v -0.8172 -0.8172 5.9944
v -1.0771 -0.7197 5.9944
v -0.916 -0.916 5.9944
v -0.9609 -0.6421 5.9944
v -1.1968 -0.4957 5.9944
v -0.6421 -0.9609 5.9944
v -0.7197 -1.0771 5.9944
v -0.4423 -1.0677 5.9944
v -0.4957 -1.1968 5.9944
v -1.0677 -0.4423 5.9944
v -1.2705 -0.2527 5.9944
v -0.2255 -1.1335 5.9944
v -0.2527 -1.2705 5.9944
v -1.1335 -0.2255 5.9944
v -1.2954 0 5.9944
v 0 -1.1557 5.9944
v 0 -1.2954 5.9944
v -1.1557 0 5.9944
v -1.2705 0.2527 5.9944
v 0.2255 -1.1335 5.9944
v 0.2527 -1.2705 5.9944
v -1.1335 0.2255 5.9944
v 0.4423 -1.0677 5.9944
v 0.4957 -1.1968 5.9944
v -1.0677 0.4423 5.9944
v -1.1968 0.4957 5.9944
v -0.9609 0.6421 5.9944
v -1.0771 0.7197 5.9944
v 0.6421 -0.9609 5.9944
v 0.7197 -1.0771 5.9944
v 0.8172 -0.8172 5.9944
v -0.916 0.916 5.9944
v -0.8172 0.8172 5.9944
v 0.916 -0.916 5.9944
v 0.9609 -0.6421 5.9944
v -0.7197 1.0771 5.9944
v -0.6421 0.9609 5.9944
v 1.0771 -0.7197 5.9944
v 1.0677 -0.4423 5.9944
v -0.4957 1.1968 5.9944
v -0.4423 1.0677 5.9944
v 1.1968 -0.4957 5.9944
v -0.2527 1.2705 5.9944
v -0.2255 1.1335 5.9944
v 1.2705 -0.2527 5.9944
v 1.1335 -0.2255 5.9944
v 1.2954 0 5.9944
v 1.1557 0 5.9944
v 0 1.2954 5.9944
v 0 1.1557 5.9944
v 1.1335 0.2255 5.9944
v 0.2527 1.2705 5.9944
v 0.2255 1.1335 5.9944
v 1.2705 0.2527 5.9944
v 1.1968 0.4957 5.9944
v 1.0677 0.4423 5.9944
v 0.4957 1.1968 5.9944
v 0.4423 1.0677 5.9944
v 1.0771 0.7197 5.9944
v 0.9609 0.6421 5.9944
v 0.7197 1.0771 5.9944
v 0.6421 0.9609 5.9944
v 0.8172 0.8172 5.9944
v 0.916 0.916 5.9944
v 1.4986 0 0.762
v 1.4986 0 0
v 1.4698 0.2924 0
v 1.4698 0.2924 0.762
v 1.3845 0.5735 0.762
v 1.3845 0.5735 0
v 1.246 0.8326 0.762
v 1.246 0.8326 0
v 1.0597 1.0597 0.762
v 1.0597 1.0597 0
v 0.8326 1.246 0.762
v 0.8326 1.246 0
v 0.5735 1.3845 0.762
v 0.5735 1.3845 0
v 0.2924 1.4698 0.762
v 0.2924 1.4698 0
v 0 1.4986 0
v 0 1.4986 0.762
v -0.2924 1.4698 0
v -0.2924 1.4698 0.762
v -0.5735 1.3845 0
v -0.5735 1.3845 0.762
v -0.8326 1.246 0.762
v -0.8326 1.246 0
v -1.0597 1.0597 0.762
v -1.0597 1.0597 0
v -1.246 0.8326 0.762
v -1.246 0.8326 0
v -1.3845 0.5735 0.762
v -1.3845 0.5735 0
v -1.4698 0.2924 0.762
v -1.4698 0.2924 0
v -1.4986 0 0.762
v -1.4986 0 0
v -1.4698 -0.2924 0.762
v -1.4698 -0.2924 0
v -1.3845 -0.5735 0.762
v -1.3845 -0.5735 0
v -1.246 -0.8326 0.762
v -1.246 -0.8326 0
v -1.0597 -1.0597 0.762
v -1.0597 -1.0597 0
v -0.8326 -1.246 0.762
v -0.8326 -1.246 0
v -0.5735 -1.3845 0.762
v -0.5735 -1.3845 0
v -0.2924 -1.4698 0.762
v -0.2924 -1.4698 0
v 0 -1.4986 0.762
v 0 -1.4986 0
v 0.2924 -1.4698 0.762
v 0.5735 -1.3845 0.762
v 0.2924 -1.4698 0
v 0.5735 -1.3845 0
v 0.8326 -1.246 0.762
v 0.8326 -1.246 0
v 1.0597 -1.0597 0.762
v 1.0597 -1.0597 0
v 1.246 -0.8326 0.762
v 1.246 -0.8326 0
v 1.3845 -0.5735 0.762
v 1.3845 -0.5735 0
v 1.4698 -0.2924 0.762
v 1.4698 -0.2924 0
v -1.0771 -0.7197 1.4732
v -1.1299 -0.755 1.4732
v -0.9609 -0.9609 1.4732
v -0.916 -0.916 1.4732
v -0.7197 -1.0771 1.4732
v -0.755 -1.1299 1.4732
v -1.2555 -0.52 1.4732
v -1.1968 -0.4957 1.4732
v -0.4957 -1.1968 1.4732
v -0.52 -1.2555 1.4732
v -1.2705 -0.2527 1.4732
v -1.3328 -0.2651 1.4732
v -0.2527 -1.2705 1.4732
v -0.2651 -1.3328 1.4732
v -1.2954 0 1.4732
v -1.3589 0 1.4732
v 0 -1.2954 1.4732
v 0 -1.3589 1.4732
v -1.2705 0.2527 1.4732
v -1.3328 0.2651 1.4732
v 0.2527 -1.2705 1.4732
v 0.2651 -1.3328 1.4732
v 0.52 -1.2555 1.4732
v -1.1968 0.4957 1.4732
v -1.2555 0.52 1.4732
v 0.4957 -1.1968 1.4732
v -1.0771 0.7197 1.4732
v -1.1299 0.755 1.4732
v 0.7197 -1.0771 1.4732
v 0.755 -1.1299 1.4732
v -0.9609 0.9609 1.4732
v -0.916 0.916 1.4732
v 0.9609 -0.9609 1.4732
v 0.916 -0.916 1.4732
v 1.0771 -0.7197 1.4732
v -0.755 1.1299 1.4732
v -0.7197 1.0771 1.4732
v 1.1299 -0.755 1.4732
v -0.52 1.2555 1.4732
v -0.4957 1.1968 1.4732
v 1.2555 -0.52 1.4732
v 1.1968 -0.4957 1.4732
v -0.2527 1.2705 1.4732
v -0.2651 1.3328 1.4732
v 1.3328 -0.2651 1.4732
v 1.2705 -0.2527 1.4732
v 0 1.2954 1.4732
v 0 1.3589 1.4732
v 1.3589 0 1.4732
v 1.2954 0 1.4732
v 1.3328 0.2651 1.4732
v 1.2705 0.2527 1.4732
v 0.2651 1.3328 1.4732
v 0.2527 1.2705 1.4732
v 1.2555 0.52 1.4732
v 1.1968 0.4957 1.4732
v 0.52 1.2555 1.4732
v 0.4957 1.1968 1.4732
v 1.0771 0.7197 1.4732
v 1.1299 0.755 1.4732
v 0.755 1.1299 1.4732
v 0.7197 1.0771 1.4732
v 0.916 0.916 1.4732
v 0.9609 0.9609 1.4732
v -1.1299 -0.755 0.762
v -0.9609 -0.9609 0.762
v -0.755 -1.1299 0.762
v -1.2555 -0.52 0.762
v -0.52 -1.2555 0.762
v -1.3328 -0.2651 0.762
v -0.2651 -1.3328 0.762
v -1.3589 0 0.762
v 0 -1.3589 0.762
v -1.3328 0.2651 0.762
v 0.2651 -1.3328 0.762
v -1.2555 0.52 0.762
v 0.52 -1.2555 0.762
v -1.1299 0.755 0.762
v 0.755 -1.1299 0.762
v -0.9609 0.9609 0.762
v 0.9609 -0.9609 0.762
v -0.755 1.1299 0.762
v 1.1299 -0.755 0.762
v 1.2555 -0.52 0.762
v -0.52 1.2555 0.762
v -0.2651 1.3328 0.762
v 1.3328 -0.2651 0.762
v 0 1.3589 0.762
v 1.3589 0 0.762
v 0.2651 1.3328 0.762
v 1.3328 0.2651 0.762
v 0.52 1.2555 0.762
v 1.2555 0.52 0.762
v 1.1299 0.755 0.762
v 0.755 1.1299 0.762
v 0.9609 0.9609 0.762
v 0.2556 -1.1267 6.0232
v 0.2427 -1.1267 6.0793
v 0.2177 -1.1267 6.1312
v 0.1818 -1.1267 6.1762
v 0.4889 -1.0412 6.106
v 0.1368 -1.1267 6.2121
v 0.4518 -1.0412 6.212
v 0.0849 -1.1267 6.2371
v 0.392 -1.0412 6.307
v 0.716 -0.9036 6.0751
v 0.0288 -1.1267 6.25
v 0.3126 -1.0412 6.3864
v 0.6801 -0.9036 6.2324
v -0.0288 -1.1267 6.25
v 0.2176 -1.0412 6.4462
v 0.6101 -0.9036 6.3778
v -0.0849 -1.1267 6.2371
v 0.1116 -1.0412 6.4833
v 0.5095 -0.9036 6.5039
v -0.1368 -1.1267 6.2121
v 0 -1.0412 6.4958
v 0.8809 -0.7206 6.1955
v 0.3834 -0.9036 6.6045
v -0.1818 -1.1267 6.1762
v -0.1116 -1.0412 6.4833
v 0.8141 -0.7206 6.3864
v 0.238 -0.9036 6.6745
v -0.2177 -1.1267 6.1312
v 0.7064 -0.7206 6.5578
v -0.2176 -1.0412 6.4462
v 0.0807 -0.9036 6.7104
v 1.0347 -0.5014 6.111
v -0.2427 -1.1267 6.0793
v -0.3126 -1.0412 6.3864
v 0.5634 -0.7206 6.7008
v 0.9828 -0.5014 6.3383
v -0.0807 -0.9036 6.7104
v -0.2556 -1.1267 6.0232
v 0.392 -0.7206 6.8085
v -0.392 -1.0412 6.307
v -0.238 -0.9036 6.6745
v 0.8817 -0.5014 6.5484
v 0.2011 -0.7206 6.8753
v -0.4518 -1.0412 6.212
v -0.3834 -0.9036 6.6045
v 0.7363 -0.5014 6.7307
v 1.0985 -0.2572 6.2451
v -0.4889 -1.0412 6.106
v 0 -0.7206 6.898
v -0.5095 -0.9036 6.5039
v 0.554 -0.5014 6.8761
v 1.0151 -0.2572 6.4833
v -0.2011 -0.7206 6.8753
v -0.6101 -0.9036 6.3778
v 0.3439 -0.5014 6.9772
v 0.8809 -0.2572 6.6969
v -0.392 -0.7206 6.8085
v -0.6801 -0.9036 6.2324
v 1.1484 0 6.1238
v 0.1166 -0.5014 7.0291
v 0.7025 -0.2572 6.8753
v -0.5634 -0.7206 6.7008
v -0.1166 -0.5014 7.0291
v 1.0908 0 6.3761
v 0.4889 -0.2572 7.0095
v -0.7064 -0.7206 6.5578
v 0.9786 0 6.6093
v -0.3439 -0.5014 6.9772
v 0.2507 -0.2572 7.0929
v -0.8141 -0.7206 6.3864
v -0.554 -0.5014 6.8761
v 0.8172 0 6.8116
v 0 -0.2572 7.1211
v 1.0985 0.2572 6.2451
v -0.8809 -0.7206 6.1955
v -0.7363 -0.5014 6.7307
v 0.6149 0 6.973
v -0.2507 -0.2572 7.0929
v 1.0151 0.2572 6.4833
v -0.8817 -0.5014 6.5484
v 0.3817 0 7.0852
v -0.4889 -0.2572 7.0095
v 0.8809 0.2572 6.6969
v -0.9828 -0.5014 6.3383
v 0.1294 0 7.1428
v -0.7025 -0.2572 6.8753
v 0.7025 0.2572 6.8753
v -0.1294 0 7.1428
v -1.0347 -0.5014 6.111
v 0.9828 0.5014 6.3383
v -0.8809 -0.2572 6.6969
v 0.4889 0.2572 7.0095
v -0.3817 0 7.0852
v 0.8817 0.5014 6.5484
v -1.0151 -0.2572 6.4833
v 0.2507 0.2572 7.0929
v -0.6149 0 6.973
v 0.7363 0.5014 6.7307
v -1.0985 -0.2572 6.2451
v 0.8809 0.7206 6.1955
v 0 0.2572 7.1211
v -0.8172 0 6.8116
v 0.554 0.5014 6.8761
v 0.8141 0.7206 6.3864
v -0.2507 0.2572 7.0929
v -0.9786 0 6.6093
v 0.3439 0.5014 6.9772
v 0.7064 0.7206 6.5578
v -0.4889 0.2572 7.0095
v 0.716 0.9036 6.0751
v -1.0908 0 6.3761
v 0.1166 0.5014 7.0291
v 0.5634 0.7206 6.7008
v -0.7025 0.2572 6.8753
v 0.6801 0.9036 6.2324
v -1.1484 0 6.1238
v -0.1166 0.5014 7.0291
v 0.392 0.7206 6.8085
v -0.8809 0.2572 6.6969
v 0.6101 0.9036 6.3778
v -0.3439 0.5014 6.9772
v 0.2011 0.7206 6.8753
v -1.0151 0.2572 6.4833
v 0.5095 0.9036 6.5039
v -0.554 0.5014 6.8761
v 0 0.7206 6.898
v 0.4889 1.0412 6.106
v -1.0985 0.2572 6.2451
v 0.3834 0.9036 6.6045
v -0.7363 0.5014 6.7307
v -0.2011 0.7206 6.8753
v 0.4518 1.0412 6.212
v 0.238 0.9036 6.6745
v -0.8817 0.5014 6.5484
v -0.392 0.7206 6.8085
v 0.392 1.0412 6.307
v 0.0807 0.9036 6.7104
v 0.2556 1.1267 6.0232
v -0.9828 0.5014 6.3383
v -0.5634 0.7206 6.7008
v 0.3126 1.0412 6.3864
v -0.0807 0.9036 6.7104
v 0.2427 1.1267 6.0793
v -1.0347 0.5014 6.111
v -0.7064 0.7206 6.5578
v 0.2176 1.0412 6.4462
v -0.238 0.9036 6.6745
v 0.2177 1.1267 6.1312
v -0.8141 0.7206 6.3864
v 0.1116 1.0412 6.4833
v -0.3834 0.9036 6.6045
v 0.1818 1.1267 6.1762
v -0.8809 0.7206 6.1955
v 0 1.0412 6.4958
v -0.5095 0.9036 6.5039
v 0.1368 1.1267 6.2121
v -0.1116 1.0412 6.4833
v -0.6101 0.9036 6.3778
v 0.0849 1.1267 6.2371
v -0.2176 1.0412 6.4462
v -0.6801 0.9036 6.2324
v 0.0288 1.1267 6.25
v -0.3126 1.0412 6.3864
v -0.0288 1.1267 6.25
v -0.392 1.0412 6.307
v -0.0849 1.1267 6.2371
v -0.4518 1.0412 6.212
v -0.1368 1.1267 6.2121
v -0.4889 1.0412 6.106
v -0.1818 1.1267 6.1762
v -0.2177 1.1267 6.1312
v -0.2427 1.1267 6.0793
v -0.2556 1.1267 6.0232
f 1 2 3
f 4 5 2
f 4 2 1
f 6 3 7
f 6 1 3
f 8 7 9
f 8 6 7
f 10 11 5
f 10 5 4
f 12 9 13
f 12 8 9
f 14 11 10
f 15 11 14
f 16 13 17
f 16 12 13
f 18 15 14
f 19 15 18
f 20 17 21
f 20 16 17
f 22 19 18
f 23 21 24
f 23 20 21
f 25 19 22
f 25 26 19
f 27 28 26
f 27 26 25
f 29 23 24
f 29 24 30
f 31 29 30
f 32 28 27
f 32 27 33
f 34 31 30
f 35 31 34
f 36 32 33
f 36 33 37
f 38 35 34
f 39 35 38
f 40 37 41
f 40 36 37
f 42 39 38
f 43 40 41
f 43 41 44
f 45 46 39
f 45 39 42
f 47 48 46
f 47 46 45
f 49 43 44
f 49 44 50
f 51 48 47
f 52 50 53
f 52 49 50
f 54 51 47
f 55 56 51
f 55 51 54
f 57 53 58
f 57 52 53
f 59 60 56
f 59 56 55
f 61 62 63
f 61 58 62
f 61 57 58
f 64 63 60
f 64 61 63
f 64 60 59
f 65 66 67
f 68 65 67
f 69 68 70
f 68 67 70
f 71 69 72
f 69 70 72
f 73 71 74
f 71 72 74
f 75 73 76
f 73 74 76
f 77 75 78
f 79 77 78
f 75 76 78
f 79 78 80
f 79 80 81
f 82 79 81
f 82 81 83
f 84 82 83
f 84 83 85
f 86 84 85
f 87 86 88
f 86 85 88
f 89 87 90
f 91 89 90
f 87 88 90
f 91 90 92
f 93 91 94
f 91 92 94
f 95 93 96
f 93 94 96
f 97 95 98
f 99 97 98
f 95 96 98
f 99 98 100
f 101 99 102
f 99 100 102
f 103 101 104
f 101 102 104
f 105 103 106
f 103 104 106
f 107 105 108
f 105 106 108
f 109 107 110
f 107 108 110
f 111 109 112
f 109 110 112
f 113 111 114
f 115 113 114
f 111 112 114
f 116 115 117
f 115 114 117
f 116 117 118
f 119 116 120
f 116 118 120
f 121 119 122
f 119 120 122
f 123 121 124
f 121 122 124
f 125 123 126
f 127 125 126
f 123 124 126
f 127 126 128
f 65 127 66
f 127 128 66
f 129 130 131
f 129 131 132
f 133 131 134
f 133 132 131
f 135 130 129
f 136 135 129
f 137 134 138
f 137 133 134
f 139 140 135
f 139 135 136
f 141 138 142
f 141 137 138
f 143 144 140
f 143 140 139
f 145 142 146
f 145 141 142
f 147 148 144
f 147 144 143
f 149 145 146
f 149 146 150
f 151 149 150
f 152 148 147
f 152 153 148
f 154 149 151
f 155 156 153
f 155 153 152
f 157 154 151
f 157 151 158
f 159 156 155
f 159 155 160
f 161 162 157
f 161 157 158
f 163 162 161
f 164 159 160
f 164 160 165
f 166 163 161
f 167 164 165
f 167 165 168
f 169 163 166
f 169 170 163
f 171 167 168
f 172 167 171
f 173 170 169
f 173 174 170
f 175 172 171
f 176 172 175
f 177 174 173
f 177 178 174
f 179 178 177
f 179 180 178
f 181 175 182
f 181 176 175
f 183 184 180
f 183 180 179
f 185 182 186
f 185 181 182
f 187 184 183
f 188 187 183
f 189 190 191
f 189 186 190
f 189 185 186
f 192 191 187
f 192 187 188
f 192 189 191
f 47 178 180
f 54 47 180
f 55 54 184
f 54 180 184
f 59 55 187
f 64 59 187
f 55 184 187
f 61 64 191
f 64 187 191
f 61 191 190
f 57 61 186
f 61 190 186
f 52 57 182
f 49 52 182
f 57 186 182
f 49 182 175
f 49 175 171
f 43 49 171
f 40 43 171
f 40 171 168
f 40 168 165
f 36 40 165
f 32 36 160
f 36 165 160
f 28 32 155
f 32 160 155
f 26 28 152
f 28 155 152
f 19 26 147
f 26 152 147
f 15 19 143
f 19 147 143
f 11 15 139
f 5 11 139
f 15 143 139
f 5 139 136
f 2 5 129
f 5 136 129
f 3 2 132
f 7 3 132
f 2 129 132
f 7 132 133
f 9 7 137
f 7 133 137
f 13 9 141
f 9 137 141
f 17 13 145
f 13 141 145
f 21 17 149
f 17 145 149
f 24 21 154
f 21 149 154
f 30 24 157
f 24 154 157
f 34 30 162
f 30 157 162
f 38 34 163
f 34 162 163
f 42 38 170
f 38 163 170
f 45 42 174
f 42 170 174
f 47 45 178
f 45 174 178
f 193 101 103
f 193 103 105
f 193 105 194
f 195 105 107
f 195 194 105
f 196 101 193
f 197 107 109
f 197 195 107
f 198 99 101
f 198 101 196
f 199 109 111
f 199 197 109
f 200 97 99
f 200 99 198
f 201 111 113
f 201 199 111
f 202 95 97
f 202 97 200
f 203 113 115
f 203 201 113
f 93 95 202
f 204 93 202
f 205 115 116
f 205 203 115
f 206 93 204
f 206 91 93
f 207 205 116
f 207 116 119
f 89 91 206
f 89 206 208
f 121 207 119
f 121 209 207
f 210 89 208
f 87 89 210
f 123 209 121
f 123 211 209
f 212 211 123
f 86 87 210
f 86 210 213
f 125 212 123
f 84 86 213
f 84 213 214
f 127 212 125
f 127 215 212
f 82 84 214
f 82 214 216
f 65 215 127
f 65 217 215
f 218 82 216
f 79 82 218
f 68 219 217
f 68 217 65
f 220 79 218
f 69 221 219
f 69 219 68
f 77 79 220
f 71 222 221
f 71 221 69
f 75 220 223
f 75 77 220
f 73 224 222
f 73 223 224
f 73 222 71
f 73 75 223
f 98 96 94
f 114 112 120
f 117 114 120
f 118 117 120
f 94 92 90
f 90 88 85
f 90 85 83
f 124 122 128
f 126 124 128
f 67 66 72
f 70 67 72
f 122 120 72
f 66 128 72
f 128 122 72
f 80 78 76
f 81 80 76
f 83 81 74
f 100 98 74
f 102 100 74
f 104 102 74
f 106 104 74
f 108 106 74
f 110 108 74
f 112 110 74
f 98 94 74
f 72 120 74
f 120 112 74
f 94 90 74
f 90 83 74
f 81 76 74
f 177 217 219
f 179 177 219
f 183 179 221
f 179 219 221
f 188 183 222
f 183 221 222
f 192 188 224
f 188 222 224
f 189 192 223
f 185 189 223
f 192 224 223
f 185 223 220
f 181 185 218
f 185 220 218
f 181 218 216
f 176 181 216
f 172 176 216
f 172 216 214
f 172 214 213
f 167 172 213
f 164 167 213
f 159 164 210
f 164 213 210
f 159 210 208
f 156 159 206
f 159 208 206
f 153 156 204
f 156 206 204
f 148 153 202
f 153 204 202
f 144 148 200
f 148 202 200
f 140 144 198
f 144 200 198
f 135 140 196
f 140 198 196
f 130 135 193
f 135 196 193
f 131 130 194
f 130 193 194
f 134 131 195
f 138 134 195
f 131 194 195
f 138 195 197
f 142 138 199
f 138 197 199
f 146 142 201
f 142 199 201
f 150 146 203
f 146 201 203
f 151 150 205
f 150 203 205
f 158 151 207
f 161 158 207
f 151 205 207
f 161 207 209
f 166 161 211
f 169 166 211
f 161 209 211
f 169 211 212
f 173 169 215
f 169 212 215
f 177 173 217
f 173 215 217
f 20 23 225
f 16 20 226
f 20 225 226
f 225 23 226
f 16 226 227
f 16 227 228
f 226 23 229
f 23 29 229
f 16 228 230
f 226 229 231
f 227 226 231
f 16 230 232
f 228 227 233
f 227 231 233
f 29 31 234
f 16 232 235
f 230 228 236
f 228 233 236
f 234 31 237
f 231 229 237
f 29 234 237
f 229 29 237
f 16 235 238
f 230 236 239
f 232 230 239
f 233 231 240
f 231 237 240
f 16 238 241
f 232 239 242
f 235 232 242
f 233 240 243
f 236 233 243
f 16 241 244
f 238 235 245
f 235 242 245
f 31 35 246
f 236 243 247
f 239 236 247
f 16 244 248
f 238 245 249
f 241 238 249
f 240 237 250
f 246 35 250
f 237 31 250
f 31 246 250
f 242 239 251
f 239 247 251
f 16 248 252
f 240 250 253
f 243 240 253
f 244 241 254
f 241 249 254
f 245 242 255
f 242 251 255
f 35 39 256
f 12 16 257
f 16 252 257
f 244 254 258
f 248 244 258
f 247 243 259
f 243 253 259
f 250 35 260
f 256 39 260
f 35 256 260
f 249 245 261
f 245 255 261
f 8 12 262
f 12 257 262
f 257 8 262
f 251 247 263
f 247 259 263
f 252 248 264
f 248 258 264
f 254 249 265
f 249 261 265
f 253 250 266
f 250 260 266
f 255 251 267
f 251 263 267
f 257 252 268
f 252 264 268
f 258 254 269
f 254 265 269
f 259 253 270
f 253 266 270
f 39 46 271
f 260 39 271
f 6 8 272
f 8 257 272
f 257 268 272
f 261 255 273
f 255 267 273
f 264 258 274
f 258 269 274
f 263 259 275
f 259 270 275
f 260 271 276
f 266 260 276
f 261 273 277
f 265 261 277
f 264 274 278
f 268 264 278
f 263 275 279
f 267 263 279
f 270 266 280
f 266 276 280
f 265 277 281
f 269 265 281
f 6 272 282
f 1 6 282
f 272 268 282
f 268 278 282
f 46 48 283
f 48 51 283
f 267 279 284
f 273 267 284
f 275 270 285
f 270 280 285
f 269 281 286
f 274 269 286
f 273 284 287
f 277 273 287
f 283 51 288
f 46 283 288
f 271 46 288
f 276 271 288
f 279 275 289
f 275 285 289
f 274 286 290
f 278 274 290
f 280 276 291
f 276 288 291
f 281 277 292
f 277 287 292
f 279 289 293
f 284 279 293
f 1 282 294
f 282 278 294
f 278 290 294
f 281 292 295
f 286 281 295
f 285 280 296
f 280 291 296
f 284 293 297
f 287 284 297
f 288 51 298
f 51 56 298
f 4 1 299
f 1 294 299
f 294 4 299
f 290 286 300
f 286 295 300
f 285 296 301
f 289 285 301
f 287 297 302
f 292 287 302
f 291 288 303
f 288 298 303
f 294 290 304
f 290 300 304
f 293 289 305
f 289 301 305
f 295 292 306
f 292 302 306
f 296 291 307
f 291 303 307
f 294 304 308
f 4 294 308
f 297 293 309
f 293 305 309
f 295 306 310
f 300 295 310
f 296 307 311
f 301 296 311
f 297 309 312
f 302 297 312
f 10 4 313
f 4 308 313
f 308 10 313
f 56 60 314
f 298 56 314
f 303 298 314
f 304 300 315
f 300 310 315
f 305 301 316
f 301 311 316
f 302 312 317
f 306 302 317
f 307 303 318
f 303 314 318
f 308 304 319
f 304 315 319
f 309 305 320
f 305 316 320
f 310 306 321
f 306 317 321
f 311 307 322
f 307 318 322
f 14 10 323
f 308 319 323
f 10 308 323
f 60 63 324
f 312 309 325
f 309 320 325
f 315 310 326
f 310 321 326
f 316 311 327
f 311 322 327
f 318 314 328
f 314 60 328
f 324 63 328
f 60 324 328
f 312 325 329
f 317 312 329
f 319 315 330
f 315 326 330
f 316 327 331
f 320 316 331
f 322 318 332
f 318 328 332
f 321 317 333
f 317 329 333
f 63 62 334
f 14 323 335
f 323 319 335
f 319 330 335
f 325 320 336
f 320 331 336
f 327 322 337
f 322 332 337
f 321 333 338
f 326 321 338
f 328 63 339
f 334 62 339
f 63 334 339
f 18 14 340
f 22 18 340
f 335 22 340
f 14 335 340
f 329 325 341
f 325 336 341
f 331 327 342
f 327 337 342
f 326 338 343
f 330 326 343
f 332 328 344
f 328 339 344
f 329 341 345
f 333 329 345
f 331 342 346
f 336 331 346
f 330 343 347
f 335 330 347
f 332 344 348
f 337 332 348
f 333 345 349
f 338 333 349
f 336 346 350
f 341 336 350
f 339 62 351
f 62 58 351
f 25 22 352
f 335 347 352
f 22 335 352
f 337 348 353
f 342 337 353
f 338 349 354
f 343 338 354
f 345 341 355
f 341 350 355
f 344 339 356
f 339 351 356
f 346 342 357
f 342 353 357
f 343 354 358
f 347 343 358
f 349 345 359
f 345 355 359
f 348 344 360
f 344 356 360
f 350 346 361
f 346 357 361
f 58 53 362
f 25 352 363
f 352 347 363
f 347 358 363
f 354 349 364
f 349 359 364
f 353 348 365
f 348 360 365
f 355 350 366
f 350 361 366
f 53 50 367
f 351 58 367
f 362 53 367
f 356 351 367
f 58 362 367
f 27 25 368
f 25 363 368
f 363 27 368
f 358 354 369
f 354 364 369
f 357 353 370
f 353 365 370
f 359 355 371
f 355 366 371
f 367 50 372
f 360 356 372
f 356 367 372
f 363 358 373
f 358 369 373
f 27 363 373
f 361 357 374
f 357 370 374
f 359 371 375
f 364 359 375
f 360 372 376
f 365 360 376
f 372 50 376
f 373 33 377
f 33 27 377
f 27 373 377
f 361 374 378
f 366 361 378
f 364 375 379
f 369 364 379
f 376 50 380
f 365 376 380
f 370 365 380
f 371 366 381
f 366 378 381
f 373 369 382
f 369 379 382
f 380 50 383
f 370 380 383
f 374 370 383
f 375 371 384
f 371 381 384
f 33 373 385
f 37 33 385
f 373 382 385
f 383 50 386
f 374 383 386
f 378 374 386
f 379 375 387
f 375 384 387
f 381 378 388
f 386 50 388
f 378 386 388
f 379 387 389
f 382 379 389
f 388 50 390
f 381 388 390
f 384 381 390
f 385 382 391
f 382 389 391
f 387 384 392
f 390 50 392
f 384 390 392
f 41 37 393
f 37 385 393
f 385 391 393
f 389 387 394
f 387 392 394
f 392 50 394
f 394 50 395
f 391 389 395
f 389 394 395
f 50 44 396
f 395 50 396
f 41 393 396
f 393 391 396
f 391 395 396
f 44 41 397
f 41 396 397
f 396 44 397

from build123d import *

# Parameters (mm, degrees)
SKETCH_R         = 1.4986
PAD_DEPTH        = 0.762
SKETCH001_R      = 1.3589
PAD001_DEPTH     = 0.7112
SKETCH002_R      = 1.2954
PAD002_DEPTH     = 4.5212
REVOLUTION_ANGLE = -180


with BuildPart() as part:
    # Sketch → Pad (new body)
    with BuildSketch(Plane.XY):
        Circle(SKETCH_R)
    extrude(amount=PAD_DEPTH)

    # Sketch001 (on Face3 of Pad) → Pad001 (join)
    with BuildSketch(Plane.XY.offset(0.762)):
        Circle(SKETCH001_R)
    extrude(amount=PAD001_DEPTH)

    # Sketch002 (on Face5 of Pad001) → Pad002 (join)
    with BuildSketch(Plane.XY.offset(1.4732)):
        Circle(SKETCH002_R)
    extrude(amount=PAD002_DEPTH)

    # Sketch003 (on Face7 of Pad002) → Revolution (revolve)
    with BuildSketch(Plane.XY.offset(5.9944)):
        with BuildLine():
            ThreePointArc((0, -1.1557), (1.1557, 0), (0, 1.1557))
            Line((0, 1.1557), (0, -1.1557))
        make_face()
    revolve(axis=Axis((0, 0, 5.9944), (0, 1, 0)), revolution_arc=REVOLUTION_ANGLE)


solid = part.part
